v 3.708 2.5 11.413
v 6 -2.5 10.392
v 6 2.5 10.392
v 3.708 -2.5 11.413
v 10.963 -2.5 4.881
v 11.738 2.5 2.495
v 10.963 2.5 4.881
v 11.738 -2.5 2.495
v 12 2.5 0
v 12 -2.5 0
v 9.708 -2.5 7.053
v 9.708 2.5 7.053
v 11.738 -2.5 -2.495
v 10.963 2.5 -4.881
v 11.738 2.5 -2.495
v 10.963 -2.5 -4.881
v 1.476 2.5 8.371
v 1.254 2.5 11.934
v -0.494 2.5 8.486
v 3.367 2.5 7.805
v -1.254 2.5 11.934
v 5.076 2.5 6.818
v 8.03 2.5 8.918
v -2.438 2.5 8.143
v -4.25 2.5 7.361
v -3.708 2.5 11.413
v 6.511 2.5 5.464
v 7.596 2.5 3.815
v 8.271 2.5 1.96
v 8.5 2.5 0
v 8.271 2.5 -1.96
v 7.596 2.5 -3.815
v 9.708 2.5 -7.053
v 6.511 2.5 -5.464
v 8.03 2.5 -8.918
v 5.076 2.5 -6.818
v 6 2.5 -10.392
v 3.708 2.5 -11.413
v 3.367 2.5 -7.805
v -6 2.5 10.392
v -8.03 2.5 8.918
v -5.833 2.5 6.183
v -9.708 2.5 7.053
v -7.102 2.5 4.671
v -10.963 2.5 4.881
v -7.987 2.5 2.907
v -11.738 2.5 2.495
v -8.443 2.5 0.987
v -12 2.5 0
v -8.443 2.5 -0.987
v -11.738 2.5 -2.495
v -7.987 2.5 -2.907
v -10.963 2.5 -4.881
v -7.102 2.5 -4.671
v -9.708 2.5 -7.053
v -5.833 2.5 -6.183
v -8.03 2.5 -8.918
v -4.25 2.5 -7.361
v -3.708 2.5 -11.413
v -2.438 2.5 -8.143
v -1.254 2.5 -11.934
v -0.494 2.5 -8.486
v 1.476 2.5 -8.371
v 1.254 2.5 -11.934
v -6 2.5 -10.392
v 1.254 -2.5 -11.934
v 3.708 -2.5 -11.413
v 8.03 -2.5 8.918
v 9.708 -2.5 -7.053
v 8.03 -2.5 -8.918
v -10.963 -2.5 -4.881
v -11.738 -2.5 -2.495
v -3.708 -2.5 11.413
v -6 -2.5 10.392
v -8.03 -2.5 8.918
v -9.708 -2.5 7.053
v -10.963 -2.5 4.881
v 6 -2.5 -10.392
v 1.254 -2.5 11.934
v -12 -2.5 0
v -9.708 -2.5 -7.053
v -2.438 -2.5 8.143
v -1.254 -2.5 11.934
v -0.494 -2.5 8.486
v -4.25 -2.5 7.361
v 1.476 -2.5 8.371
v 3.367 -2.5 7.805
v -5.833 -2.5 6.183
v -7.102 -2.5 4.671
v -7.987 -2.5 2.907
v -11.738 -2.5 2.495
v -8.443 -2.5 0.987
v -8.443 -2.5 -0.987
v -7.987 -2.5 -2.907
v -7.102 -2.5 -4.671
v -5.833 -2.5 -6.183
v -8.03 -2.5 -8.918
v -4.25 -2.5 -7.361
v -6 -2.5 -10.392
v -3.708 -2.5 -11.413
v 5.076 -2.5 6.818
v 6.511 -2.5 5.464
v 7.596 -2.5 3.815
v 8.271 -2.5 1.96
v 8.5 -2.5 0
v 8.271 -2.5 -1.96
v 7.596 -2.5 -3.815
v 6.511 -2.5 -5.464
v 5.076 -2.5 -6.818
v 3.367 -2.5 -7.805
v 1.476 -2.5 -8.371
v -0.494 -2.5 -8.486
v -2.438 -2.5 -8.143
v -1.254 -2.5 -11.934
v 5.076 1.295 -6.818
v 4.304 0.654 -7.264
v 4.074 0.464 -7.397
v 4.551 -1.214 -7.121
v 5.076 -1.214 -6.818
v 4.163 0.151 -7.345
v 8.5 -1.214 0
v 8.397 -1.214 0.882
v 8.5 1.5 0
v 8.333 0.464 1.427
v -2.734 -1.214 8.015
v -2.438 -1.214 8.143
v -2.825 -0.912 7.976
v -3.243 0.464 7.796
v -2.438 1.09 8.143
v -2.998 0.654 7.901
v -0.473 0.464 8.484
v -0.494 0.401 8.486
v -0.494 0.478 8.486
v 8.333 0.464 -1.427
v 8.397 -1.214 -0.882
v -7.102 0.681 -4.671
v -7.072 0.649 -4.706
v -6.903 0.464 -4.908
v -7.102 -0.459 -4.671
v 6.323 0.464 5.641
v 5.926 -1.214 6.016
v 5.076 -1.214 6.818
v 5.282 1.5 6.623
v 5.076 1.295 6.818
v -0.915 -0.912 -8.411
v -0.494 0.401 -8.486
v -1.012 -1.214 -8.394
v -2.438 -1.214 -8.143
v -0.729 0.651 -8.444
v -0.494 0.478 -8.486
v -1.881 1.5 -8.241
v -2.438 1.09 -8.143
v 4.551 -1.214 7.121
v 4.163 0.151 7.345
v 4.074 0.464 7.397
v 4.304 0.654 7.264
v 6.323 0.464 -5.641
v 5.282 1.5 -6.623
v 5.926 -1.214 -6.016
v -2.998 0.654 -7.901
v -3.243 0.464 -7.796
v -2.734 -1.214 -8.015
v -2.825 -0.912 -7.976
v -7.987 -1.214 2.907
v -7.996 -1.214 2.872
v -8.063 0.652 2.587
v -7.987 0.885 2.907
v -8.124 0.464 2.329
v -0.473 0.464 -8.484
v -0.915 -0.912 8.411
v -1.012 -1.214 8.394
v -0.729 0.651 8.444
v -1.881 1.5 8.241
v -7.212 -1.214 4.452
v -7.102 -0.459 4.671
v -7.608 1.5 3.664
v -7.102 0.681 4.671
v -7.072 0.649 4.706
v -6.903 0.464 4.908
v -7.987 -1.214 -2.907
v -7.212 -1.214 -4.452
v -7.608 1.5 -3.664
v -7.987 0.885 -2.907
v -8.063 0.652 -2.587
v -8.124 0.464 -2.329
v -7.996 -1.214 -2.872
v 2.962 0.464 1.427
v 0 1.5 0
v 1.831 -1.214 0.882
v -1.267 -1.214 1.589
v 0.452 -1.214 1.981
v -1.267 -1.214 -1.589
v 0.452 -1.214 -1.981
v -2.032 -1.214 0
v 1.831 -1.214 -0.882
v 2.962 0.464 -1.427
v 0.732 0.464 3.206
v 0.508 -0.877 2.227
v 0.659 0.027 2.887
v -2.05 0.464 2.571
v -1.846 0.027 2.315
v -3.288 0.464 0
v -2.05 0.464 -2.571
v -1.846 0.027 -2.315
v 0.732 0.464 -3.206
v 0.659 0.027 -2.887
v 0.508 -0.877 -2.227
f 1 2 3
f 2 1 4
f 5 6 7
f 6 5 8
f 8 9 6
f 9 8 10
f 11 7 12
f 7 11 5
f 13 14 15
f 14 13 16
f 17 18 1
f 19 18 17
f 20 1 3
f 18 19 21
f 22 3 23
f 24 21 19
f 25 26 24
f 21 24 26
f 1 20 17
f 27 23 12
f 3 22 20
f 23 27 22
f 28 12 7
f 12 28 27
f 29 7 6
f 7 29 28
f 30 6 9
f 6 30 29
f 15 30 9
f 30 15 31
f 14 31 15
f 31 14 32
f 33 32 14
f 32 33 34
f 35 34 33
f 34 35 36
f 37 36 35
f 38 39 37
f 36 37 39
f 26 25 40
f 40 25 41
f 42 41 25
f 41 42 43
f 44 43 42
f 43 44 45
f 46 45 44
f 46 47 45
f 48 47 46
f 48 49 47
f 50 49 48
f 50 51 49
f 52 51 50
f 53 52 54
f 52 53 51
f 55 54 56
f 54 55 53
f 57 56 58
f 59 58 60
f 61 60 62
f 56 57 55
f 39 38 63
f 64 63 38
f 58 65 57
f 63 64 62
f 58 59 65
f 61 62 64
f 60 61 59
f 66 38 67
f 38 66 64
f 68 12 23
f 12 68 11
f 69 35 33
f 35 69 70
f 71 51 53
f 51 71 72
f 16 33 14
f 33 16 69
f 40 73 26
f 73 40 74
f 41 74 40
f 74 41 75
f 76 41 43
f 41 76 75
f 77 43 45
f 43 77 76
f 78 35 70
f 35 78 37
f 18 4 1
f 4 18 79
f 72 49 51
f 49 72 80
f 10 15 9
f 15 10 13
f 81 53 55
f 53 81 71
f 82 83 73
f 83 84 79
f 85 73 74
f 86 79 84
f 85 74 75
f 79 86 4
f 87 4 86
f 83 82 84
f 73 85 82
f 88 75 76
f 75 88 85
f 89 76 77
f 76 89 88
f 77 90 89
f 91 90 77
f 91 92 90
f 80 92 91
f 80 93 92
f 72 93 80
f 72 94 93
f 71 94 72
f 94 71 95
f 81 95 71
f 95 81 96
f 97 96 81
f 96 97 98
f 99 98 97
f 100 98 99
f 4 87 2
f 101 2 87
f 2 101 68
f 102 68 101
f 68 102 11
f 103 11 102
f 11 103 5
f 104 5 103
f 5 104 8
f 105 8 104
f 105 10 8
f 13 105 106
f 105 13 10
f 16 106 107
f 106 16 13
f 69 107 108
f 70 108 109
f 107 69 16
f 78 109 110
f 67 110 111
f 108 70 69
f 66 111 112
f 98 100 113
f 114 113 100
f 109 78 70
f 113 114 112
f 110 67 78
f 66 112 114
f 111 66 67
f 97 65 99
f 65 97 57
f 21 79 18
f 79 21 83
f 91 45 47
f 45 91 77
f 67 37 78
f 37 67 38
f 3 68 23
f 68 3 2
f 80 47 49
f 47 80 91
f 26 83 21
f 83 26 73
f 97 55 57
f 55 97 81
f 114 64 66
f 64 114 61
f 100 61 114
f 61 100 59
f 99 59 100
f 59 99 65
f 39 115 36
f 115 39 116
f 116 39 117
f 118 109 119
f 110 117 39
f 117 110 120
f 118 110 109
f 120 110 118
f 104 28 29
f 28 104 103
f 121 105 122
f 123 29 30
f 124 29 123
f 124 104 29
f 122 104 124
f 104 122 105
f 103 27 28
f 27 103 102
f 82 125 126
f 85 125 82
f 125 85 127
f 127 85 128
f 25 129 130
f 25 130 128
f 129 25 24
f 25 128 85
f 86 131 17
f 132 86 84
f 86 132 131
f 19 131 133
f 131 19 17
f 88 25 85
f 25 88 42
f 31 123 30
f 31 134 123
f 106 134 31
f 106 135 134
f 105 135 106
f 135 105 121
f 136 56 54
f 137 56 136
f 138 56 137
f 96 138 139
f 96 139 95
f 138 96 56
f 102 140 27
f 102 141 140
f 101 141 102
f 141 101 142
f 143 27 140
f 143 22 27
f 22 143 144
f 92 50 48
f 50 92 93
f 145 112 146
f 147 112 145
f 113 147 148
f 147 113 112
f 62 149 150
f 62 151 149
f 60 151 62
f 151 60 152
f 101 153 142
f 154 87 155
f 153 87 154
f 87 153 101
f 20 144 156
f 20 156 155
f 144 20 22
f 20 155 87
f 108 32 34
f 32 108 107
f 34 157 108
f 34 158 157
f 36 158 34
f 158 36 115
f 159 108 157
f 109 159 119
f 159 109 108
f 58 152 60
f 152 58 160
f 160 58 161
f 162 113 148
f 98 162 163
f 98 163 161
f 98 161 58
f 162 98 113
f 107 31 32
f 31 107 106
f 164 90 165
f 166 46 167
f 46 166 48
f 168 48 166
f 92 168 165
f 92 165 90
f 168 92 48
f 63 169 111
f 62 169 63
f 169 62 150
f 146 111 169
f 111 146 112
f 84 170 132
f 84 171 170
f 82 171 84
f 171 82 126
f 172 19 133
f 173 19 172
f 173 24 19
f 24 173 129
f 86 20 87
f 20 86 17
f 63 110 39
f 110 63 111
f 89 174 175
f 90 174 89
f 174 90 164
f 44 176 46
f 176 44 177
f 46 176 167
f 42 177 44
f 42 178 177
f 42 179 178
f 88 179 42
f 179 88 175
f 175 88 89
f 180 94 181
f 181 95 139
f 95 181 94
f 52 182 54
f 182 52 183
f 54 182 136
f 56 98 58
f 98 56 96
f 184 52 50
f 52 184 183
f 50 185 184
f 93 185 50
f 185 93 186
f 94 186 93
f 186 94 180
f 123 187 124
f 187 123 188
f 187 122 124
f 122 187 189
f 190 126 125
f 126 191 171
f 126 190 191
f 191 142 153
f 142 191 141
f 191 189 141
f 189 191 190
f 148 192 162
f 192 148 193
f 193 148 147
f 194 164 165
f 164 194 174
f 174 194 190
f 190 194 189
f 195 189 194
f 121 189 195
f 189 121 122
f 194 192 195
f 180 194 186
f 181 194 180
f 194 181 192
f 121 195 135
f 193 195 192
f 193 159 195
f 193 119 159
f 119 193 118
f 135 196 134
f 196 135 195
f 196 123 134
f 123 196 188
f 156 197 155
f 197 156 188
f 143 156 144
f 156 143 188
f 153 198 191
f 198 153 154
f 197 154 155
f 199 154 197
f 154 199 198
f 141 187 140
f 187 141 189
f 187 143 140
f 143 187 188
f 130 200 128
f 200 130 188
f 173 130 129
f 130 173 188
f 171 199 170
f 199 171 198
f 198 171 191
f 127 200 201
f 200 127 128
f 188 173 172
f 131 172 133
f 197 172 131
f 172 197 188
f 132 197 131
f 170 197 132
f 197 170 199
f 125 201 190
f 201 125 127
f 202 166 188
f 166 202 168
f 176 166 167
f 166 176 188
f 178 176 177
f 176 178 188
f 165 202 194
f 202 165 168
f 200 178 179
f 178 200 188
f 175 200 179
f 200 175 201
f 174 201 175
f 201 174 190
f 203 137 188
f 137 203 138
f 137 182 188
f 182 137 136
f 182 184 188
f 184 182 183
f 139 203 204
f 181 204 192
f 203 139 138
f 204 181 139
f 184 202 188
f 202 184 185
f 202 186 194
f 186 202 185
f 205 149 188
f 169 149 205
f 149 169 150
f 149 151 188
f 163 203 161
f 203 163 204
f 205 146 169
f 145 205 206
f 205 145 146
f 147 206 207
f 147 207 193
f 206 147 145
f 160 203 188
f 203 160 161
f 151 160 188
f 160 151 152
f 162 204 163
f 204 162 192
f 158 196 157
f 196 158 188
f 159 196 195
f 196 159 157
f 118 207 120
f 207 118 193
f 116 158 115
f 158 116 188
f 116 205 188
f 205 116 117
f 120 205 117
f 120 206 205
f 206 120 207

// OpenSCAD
module body(width=20, base_length=60, top_length=30, base_height=10, top_height=10, top_offset=5, front_bumper, rear_bumper) {
    
    // Car body base 
    cube([base_length,width,base_height],center=true); 
    
    // Car body top 
    translate([top_offset,0,base_height/2+top_height/2 - 0.001])
        cube([top_length,width,top_height],center=true); 
    
    if (front_bumper){
        // Front bumper
        color("blue") {
            translate([-base_length/2,0,0])rotate([90,0,0]) {
                cylinder(h=width - base_height,r=base_height/2,center=true);
                translate([0,0,(width - base_height)/2])
                    sphere(r=base_height/2);
                translate([0,0,-(width - base_height)/2])
                    sphere(r=base_height/2);
            }
        }
    }

    if (rear_bumper) {
        // Rear bumper
        color("blue") {
            translate([base_length/2,0,0])rotate([90,0,0]) {
                cylinder(h=width - base_height,r=base_height/2,center=true);
                translate([0,0,(width - base_height)/2])
                    sphere(r=base_height/2);
                translate([0,0,-(width - base_height)/2])
                    sphere(r=base_height/2);
            }
        }
    }
}


module simple_wheel(wheel_radius=10, wheel_width=6) {
    rotate([90,0,0])
        cylinder(h=wheel_width,r=wheel_radius,center=true);
}

module complex_wheel(wheel_radius=10, side_spheres_radius=50, hub_thickness=4, cylinder_radius=2) {
    cylinder_height=2*wheel_radius; 
    difference() { 
        // Wheel sphere
        sphere(r=wheel_radius); 
        // Side sphere 1 
        translate([0,side_spheres_radius + hub_thickness/2,0])
            sphere(r=side_spheres_radius); 
        // Side sphere 2 
        translate([0,- (side_spheres_radius + hub_thickness/2),0])
            sphere(r=side_spheres_radius); 
        // Cylinder 1
        translate([wheel_radius/2,0,0])
            rotate([90,0,0])
            cylinder(h=cylinder_height,r=cylinder_radius,center=true); 
        // Cylinder 2 
        translate([0,0,wheel_radius/2])
            rotate([90,0,0])
            cylinder(h=cylinder_height,r=cylinder_radius,center=true); 
        // Cylinder 3 
        translate([-wheel_radius/2,0,0])
            rotate([90,0,0])
            cylinder(h=cylinder_height,r=cylinder_radius,center=true); 
        // Cylinder 4 
        translate([0,0,-wheel_radius/2])
            rotate([90,0,0])
            cylinder(h=cylinder_height,r=cylinder_radius,center=true); 
    }
}

module axle(track=30, radius=2) {
    rotate([90,0,0])
    cylinder(h=track,r=radius,center=true); 
}

module spoked_wheel(radius=12, width=5, thickness=7, number_of_spokes=7, spoke_radius=1.5){
    
    rotate([90,0,0]) {
        difference() {
            cylinder(r = radius, h = width, center = true);
            cylinder(r = radius - thickness/2, h = width + 1, center = true);
        }
        
        spoke_length = radius - thickness/4;
        step = 360 / number_of_spokes;
        for (i=[0:step:359]) {
            angle = i;
            rotate([0, 90, angle])
                cylinder(h=spoke_length, r=spoke_radius);
        }
    }
}
spoked_wheel();
